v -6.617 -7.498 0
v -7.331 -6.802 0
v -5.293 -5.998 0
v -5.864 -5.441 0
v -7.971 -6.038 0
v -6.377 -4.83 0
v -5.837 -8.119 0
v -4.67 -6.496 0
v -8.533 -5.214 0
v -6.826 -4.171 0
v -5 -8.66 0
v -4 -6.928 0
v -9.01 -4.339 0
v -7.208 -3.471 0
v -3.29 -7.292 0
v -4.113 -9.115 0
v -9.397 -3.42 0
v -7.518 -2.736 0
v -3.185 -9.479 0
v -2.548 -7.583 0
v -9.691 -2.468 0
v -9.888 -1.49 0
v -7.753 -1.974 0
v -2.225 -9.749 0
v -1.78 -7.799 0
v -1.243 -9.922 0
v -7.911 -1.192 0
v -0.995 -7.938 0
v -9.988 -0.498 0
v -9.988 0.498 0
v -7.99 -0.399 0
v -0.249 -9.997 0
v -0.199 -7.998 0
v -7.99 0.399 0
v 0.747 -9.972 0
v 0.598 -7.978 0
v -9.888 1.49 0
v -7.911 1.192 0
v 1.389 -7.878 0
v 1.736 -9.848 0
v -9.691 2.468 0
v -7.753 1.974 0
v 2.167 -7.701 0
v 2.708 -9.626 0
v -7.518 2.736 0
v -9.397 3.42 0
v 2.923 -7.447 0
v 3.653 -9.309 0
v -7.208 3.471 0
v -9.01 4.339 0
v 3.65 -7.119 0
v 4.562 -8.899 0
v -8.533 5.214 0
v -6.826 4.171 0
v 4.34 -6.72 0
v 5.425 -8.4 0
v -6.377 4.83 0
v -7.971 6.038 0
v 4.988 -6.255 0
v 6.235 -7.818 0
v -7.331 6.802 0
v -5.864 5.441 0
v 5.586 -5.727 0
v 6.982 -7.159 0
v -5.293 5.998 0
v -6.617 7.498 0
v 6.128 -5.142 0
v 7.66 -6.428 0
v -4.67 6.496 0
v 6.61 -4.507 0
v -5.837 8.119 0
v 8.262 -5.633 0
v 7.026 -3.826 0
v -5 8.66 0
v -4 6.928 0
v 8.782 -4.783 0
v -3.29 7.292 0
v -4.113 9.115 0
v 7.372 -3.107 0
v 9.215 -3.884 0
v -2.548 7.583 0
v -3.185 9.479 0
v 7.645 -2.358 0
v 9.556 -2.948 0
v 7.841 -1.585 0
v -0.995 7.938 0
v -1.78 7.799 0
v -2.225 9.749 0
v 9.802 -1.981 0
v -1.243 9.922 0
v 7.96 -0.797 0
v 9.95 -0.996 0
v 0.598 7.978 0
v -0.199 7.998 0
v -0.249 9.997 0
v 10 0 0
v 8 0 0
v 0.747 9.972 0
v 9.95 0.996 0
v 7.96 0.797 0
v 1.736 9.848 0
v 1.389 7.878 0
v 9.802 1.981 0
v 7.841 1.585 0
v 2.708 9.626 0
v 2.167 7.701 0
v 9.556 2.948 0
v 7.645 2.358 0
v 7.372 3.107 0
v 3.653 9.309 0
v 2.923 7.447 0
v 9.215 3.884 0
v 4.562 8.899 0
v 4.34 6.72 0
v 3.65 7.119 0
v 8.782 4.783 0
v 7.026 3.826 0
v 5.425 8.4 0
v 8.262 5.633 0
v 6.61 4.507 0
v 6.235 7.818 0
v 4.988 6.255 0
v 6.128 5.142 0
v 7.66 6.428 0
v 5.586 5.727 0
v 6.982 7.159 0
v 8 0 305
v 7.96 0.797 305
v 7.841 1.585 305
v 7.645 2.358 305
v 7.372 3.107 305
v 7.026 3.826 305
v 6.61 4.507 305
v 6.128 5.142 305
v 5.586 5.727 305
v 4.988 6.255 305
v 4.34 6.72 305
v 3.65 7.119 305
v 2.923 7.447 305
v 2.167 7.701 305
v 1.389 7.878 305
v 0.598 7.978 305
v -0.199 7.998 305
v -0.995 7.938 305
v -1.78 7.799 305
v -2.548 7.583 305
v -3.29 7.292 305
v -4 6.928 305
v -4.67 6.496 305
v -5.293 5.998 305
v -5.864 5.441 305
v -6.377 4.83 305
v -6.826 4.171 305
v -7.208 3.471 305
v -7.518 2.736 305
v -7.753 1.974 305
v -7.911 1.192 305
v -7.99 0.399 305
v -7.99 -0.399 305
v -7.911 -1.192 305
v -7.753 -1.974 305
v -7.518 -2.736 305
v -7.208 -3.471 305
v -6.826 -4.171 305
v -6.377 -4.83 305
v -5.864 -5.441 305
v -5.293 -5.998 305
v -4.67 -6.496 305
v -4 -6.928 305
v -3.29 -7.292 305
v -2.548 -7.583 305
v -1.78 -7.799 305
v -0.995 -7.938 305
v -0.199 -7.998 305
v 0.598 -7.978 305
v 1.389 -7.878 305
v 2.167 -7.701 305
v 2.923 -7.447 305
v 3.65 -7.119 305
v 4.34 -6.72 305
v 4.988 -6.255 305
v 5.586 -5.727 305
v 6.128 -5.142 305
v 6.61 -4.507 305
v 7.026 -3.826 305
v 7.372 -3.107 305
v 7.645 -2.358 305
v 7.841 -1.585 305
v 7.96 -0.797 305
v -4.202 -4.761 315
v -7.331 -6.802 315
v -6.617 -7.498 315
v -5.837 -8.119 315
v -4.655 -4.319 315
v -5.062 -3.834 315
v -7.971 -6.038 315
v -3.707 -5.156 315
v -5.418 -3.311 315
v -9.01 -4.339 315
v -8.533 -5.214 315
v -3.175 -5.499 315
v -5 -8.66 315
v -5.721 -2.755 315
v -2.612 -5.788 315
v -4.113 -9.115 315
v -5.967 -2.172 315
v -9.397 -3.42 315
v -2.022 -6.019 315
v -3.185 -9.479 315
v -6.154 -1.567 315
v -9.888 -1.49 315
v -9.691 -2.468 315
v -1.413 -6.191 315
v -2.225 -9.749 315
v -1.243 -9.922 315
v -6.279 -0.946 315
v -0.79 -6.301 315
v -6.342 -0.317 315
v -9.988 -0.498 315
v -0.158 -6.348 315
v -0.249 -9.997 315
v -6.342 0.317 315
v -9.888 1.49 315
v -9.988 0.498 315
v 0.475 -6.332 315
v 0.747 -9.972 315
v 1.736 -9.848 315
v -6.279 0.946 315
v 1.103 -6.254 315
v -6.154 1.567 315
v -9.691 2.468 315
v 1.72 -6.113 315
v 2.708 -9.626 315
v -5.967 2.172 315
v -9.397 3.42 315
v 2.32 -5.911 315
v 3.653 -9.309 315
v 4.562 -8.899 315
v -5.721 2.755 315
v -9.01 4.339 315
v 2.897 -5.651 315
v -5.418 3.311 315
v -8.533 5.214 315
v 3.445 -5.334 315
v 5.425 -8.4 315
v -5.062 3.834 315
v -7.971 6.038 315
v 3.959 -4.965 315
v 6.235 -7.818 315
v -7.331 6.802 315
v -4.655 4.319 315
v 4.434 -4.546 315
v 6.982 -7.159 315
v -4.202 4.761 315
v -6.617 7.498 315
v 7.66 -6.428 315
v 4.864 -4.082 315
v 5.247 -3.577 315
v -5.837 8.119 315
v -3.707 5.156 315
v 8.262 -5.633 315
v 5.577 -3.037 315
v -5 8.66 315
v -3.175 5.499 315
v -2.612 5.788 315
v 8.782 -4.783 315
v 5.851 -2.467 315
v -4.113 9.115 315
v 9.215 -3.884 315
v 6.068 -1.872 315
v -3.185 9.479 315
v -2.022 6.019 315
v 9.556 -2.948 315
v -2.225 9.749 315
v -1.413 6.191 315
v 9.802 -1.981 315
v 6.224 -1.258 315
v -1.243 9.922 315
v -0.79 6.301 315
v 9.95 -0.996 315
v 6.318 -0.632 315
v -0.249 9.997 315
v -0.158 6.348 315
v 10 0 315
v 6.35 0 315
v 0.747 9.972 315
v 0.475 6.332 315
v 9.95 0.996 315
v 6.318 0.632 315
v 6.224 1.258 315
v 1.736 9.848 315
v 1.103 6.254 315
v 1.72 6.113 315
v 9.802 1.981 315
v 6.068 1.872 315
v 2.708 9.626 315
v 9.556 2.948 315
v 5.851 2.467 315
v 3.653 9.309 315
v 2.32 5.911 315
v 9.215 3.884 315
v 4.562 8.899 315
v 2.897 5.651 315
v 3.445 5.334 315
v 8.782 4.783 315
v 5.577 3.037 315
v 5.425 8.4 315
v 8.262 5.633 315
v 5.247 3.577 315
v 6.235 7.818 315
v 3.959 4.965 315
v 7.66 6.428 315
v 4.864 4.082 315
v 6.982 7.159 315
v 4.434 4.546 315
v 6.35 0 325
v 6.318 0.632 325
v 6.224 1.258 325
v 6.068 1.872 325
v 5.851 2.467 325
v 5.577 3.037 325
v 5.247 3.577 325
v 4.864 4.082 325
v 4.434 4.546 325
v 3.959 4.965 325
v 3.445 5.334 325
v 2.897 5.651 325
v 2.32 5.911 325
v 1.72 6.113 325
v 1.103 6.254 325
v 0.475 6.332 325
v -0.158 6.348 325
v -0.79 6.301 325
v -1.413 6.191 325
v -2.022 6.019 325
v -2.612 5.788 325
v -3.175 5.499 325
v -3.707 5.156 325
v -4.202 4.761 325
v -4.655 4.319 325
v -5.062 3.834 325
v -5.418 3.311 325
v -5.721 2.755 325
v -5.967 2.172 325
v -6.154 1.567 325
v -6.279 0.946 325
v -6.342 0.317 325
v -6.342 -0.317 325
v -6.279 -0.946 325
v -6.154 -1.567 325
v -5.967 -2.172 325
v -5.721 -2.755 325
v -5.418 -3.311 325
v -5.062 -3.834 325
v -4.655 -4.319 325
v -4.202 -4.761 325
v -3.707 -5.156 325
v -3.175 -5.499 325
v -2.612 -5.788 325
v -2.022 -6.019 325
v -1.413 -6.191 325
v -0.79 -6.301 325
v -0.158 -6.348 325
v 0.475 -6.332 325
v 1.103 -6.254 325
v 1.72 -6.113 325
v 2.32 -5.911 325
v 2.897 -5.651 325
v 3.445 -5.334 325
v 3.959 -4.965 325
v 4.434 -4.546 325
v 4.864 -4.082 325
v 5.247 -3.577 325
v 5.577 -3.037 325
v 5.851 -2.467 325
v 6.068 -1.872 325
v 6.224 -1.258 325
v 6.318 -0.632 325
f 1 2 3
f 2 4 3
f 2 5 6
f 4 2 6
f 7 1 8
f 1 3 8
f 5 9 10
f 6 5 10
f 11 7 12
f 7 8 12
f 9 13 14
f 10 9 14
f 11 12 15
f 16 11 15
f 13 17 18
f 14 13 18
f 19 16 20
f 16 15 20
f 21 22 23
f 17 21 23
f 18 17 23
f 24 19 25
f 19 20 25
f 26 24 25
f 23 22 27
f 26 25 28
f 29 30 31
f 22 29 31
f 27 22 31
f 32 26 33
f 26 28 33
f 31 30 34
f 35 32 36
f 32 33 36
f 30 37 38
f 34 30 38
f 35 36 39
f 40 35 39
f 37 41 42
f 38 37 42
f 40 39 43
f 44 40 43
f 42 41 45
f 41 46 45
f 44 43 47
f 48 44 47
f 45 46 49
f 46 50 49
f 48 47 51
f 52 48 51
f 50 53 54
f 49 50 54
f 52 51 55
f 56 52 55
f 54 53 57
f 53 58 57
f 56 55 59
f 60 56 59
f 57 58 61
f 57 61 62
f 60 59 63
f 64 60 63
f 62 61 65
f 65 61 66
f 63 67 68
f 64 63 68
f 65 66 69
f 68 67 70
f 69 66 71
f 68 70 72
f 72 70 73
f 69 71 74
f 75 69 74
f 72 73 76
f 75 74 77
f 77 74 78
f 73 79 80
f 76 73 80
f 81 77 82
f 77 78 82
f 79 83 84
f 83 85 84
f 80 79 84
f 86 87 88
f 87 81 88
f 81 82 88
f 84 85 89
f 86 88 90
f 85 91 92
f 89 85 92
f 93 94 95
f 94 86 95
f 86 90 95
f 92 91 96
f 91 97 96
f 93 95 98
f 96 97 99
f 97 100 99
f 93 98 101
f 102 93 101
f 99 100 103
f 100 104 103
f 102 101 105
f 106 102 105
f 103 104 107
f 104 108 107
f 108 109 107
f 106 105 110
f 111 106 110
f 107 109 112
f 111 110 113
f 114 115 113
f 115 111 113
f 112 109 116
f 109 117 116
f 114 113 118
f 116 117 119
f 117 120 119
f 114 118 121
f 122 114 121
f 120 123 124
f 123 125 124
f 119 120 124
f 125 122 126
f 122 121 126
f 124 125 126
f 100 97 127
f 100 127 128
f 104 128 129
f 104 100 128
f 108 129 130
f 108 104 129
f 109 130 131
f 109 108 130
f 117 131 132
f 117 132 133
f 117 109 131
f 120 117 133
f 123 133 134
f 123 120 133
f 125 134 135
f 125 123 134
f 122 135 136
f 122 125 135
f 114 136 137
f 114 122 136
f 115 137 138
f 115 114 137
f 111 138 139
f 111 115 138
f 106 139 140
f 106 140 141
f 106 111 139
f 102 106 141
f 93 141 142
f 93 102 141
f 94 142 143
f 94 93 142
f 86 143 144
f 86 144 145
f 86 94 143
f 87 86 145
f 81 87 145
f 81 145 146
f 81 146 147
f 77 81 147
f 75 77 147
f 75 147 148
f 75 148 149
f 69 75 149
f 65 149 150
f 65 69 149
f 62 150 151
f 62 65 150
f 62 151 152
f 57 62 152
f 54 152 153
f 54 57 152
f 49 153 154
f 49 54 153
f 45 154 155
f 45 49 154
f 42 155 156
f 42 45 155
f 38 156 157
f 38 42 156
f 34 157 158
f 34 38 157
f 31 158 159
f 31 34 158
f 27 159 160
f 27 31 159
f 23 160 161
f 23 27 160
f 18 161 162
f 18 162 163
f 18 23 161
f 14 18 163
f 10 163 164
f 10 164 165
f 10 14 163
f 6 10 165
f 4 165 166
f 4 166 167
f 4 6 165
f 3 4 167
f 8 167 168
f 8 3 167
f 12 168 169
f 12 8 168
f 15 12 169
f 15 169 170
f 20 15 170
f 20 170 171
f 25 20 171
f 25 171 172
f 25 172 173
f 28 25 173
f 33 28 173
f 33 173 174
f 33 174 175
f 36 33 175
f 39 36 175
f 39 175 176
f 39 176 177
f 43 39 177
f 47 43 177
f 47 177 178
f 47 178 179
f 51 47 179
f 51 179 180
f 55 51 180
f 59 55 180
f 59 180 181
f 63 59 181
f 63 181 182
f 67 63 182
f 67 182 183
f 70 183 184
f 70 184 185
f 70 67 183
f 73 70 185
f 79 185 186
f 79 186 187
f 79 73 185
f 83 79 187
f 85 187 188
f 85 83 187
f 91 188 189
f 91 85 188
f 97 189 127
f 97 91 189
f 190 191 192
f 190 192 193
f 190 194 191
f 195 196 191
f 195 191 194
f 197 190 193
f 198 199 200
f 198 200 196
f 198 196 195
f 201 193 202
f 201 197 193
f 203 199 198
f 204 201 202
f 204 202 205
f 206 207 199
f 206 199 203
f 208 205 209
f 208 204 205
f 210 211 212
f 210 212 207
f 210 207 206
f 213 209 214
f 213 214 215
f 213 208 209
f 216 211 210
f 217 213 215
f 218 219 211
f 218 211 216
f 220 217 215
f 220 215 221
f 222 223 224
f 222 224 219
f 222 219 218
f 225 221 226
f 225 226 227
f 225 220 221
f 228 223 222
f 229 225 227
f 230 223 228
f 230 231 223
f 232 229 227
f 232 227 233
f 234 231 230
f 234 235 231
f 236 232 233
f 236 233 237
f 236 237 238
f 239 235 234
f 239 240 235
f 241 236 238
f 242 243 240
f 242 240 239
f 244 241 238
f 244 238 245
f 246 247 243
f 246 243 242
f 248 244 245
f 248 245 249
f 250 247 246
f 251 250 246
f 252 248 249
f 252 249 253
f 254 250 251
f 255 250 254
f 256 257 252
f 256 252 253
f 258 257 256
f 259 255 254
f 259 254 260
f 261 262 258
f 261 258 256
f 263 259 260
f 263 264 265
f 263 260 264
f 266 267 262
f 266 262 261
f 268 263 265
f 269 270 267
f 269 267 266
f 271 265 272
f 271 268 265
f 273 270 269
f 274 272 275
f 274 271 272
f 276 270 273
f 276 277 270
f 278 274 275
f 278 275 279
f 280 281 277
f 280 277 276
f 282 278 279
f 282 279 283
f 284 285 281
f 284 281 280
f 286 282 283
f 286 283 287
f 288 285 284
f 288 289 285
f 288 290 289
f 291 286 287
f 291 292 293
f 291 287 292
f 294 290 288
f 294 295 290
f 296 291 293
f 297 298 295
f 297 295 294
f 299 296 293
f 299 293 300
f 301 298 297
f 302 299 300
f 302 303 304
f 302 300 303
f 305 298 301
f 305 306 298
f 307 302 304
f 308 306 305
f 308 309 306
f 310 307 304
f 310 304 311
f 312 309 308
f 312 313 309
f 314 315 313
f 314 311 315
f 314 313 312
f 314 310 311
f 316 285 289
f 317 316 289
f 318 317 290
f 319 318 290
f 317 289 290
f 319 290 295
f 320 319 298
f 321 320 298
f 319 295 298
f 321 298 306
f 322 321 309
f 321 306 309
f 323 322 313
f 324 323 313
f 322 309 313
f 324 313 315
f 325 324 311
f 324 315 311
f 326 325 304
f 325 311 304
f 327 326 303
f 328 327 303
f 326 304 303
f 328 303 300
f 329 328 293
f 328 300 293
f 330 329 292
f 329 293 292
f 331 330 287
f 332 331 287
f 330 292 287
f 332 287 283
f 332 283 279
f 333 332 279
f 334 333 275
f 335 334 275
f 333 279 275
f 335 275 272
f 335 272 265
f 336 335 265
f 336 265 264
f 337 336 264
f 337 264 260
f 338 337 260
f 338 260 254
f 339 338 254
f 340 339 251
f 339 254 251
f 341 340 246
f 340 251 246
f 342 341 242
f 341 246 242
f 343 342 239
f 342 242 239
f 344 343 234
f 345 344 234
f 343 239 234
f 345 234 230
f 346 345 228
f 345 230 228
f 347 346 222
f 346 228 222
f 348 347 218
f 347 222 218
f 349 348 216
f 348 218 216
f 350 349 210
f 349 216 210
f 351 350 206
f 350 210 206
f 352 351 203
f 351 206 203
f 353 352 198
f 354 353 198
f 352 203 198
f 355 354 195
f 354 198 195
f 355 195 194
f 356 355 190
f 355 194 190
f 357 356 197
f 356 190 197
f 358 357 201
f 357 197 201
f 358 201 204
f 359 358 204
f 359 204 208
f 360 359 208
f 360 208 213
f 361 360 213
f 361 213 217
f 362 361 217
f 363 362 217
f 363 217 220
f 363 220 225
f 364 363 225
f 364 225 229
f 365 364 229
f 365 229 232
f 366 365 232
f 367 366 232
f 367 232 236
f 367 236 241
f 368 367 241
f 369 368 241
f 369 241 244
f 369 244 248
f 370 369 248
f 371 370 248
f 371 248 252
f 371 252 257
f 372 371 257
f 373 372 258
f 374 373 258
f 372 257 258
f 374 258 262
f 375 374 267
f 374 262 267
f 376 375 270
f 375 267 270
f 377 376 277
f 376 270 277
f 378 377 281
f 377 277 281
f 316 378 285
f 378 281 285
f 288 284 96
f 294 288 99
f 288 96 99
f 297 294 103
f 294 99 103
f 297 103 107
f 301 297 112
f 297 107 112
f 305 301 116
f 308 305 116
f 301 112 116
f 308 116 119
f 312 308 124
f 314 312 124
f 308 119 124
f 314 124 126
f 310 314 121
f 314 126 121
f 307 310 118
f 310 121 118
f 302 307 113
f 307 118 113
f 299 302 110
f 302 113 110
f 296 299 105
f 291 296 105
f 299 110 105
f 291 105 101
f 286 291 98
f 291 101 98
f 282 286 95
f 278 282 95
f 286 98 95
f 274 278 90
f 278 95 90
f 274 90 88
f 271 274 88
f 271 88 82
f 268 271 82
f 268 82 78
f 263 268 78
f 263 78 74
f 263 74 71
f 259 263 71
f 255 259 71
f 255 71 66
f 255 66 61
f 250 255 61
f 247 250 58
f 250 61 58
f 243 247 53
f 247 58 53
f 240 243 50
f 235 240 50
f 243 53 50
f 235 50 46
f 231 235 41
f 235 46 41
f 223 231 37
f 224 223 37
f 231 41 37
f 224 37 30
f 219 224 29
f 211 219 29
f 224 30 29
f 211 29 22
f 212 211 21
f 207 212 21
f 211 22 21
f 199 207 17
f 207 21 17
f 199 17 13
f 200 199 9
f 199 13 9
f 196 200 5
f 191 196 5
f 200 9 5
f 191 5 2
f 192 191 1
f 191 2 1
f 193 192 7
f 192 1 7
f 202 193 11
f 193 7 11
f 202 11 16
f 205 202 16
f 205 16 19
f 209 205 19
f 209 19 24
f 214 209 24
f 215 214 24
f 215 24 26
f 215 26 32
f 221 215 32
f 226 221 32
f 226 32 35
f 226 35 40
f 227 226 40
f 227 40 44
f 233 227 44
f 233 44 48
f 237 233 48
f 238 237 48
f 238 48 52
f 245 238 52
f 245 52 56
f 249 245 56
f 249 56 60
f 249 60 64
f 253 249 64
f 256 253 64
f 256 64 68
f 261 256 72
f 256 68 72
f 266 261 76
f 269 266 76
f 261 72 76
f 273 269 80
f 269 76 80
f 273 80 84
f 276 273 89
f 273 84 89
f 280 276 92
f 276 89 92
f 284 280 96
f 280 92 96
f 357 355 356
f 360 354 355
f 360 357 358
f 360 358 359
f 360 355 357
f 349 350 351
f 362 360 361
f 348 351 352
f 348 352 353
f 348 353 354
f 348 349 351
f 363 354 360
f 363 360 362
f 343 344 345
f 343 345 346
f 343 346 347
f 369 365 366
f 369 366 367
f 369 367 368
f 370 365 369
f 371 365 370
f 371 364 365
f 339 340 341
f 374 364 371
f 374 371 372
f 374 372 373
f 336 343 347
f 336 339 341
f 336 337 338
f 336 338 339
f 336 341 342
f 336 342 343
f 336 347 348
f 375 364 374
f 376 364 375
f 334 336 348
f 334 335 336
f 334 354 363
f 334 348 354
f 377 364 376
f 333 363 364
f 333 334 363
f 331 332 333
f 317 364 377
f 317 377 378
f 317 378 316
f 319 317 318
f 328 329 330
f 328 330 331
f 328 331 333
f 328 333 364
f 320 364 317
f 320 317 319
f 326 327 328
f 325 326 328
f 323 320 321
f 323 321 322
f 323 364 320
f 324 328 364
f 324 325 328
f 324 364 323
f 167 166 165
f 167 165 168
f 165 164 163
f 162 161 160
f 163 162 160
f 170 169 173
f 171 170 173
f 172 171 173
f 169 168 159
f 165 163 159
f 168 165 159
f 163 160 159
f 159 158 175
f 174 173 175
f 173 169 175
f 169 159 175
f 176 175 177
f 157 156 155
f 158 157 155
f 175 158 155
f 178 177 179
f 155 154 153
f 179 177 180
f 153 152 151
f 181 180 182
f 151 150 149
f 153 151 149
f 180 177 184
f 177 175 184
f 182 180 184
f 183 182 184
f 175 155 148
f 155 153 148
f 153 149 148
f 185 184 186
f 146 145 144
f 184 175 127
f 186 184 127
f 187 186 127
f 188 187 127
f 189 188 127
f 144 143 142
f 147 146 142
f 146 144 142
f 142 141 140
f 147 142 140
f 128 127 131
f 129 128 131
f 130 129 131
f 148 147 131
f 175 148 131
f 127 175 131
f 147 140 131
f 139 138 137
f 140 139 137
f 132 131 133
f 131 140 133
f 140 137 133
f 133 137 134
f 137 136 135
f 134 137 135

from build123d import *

# Parameters (mm, degrees)
SKETCH1_R           = 10
SKETCH1_R_2         = 8
BOSS_EXTRUDE1_DEPTH = 305
SKETCH2_R           = 10
BOSS_EXTRUDE2_DEPTH = 10
SKETCH3_R           = 6.35
BOSS_EXTRUDE3_DEPTH = 10


with BuildPart() as part:
    # Sketch1 → Boss-Extrude1 (new body)
    with BuildSketch(Plane.XY):
        Circle(SKETCH1_R)
        Circle(SKETCH1_R_2, mode=Mode.SUBTRACT)
    extrude(amount=BOSS_EXTRUDE1_DEPTH)

    # Sketch2 → Boss-Extrude2 (add)
    with BuildSketch(Plane.XY.offset(305)):
        Circle(SKETCH2_R)
    extrude(amount=BOSS_EXTRUDE2_DEPTH)

    # Sketch3 → Boss-Extrude3 (add)
    with BuildSketch(Plane.XY.offset(315)):
        Circle(SKETCH3_R)
    extrude(amount=BOSS_EXTRUDE3_DEPTH)


solid = part.part
